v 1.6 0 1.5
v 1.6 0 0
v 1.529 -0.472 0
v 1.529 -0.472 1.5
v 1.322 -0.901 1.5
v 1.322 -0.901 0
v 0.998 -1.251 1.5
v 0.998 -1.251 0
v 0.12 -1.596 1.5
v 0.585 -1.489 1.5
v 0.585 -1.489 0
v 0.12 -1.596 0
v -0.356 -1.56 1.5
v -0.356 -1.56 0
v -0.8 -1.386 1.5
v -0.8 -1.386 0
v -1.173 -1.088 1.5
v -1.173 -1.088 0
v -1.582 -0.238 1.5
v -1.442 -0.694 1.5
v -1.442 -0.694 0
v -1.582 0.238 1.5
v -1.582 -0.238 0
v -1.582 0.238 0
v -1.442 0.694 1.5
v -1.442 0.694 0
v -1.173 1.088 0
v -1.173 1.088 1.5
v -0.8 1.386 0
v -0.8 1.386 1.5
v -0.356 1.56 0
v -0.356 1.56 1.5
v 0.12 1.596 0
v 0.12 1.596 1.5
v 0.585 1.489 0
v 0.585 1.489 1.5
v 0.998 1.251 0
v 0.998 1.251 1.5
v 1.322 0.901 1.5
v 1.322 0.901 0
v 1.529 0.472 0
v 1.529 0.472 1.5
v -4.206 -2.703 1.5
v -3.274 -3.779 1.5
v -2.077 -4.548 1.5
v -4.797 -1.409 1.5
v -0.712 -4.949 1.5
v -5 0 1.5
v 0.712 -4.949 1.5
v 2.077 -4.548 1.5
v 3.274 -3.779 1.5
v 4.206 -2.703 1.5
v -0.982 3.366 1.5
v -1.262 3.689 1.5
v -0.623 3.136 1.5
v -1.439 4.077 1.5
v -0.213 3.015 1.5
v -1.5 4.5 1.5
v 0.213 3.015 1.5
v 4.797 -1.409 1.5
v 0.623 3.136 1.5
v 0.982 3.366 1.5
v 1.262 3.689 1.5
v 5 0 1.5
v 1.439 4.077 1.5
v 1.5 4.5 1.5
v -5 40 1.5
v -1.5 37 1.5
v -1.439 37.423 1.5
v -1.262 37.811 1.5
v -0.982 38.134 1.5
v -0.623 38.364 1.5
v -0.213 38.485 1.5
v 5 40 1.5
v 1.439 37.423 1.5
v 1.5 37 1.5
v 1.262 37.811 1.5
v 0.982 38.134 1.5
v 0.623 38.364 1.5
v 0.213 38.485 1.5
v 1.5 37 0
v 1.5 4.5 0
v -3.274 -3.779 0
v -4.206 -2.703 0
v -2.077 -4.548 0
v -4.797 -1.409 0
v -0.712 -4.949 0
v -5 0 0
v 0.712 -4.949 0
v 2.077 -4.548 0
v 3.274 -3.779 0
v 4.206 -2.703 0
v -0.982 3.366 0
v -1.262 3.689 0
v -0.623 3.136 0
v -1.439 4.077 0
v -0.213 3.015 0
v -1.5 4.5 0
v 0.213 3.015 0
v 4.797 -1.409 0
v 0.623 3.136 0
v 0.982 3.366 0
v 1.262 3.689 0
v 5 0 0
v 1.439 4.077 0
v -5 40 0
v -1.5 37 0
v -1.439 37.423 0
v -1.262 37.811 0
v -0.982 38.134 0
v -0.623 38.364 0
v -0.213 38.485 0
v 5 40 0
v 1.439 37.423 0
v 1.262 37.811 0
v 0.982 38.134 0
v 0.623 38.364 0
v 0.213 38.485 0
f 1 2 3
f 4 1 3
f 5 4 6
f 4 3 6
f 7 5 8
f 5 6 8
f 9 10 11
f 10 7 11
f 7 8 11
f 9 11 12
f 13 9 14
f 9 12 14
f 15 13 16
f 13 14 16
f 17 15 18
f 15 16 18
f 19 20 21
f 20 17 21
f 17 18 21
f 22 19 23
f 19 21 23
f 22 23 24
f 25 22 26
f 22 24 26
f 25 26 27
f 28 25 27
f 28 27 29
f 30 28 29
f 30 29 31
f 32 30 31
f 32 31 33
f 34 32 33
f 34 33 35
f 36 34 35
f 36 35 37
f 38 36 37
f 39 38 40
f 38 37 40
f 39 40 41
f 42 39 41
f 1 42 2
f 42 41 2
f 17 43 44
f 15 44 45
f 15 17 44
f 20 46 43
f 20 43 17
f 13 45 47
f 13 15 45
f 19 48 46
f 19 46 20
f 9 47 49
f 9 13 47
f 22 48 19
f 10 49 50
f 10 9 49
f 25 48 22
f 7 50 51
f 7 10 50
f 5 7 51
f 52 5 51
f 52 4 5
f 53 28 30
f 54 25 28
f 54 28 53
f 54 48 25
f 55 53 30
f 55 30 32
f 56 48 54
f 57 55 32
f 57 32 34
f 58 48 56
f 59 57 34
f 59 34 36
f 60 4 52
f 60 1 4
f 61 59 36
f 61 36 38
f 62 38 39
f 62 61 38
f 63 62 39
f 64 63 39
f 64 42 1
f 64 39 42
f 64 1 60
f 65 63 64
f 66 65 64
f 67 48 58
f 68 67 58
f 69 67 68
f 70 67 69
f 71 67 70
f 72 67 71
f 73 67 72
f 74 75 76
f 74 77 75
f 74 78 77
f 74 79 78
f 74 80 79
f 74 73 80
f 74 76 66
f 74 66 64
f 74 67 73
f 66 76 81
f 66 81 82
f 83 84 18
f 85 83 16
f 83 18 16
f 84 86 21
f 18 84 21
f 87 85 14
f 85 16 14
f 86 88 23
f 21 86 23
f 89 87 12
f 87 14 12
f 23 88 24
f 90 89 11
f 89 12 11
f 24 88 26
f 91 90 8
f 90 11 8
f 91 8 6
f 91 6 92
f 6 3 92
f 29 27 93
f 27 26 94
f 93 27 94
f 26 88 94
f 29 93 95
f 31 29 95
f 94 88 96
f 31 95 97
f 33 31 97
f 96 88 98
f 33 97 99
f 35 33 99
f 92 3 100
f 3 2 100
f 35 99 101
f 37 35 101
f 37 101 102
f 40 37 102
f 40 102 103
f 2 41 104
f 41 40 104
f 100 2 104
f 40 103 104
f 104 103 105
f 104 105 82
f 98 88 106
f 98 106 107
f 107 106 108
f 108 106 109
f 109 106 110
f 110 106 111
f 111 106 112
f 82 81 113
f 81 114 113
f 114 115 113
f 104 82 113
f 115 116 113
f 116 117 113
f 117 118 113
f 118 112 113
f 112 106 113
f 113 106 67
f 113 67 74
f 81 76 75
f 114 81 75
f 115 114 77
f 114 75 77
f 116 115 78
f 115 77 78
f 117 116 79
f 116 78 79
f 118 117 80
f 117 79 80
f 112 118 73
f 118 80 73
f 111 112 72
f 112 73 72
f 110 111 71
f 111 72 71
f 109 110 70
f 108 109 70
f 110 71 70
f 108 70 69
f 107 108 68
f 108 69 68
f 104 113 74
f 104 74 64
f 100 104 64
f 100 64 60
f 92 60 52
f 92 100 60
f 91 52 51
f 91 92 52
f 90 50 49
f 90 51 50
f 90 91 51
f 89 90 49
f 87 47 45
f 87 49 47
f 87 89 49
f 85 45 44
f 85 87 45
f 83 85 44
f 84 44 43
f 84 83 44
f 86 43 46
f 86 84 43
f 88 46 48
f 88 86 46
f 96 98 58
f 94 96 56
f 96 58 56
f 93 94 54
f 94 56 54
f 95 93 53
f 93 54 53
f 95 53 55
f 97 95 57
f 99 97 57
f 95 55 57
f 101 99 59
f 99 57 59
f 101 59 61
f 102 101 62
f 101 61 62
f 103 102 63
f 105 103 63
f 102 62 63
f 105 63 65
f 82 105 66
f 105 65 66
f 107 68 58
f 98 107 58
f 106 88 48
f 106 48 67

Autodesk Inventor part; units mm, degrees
ref_plane "YZ Plane" through (0, 0, 0) normal (1, 0, 0) x (0, 1, 0)
ref_plane "XZ Plane" through (0, 0, 0) normal (0, 1, 0) x (-1, 0, 0)
ref_plane "XY Plane" through (0, 0, 0) normal (0, 0, 1) x (1, 0, 0)
sketch "スケッチ1" plane through (0, 0, 0) normal (0, 0, 1) x (1, 0, 0)
  circle A0 centre (0, 0) radius 1.6
  circle A1 centre (0, 0) radius 5
  line L0 (-5, 0) -> (-5, 40)
  line L1 (-5, 40) -> (5, 40)
  line L2 (5, 40) -> (5, 0)
  dimension "d0" = 3.2
  dimension "d1" = 10
  dimension "d2" = 40
extrude "押し出し1" add sketch "スケッチ1" along normal blind 1.5
sketch "スケッチ2" plane through (0, 0, 1.5) normal (0, 0, 1) x (1, 0, 0)
  circle A0 centre (0, 0) radius 1.6 projected
  circle A1 centre (0, 0) radius 3
  circle A2 centre (0, 4.5) radius 1.5
  circle A3 centre (0, 37) radius 1.5
  line L0 (5, 40) -> (-5, 40) projected
  line L1 (1.5, 37) -> (1.5, 4.5)
  line L2 (-1.5, 37) -> (-1.5, 4.5)
  dimension "d5" = 6
  dimension "d6" = 3
  dimension "d7" = 3
extrude "押し出し2" cut sketch "スケッチ2" against normal through all contours A2 | L2 A3 L1 A2 | A3
properties part number "kosinopich"
